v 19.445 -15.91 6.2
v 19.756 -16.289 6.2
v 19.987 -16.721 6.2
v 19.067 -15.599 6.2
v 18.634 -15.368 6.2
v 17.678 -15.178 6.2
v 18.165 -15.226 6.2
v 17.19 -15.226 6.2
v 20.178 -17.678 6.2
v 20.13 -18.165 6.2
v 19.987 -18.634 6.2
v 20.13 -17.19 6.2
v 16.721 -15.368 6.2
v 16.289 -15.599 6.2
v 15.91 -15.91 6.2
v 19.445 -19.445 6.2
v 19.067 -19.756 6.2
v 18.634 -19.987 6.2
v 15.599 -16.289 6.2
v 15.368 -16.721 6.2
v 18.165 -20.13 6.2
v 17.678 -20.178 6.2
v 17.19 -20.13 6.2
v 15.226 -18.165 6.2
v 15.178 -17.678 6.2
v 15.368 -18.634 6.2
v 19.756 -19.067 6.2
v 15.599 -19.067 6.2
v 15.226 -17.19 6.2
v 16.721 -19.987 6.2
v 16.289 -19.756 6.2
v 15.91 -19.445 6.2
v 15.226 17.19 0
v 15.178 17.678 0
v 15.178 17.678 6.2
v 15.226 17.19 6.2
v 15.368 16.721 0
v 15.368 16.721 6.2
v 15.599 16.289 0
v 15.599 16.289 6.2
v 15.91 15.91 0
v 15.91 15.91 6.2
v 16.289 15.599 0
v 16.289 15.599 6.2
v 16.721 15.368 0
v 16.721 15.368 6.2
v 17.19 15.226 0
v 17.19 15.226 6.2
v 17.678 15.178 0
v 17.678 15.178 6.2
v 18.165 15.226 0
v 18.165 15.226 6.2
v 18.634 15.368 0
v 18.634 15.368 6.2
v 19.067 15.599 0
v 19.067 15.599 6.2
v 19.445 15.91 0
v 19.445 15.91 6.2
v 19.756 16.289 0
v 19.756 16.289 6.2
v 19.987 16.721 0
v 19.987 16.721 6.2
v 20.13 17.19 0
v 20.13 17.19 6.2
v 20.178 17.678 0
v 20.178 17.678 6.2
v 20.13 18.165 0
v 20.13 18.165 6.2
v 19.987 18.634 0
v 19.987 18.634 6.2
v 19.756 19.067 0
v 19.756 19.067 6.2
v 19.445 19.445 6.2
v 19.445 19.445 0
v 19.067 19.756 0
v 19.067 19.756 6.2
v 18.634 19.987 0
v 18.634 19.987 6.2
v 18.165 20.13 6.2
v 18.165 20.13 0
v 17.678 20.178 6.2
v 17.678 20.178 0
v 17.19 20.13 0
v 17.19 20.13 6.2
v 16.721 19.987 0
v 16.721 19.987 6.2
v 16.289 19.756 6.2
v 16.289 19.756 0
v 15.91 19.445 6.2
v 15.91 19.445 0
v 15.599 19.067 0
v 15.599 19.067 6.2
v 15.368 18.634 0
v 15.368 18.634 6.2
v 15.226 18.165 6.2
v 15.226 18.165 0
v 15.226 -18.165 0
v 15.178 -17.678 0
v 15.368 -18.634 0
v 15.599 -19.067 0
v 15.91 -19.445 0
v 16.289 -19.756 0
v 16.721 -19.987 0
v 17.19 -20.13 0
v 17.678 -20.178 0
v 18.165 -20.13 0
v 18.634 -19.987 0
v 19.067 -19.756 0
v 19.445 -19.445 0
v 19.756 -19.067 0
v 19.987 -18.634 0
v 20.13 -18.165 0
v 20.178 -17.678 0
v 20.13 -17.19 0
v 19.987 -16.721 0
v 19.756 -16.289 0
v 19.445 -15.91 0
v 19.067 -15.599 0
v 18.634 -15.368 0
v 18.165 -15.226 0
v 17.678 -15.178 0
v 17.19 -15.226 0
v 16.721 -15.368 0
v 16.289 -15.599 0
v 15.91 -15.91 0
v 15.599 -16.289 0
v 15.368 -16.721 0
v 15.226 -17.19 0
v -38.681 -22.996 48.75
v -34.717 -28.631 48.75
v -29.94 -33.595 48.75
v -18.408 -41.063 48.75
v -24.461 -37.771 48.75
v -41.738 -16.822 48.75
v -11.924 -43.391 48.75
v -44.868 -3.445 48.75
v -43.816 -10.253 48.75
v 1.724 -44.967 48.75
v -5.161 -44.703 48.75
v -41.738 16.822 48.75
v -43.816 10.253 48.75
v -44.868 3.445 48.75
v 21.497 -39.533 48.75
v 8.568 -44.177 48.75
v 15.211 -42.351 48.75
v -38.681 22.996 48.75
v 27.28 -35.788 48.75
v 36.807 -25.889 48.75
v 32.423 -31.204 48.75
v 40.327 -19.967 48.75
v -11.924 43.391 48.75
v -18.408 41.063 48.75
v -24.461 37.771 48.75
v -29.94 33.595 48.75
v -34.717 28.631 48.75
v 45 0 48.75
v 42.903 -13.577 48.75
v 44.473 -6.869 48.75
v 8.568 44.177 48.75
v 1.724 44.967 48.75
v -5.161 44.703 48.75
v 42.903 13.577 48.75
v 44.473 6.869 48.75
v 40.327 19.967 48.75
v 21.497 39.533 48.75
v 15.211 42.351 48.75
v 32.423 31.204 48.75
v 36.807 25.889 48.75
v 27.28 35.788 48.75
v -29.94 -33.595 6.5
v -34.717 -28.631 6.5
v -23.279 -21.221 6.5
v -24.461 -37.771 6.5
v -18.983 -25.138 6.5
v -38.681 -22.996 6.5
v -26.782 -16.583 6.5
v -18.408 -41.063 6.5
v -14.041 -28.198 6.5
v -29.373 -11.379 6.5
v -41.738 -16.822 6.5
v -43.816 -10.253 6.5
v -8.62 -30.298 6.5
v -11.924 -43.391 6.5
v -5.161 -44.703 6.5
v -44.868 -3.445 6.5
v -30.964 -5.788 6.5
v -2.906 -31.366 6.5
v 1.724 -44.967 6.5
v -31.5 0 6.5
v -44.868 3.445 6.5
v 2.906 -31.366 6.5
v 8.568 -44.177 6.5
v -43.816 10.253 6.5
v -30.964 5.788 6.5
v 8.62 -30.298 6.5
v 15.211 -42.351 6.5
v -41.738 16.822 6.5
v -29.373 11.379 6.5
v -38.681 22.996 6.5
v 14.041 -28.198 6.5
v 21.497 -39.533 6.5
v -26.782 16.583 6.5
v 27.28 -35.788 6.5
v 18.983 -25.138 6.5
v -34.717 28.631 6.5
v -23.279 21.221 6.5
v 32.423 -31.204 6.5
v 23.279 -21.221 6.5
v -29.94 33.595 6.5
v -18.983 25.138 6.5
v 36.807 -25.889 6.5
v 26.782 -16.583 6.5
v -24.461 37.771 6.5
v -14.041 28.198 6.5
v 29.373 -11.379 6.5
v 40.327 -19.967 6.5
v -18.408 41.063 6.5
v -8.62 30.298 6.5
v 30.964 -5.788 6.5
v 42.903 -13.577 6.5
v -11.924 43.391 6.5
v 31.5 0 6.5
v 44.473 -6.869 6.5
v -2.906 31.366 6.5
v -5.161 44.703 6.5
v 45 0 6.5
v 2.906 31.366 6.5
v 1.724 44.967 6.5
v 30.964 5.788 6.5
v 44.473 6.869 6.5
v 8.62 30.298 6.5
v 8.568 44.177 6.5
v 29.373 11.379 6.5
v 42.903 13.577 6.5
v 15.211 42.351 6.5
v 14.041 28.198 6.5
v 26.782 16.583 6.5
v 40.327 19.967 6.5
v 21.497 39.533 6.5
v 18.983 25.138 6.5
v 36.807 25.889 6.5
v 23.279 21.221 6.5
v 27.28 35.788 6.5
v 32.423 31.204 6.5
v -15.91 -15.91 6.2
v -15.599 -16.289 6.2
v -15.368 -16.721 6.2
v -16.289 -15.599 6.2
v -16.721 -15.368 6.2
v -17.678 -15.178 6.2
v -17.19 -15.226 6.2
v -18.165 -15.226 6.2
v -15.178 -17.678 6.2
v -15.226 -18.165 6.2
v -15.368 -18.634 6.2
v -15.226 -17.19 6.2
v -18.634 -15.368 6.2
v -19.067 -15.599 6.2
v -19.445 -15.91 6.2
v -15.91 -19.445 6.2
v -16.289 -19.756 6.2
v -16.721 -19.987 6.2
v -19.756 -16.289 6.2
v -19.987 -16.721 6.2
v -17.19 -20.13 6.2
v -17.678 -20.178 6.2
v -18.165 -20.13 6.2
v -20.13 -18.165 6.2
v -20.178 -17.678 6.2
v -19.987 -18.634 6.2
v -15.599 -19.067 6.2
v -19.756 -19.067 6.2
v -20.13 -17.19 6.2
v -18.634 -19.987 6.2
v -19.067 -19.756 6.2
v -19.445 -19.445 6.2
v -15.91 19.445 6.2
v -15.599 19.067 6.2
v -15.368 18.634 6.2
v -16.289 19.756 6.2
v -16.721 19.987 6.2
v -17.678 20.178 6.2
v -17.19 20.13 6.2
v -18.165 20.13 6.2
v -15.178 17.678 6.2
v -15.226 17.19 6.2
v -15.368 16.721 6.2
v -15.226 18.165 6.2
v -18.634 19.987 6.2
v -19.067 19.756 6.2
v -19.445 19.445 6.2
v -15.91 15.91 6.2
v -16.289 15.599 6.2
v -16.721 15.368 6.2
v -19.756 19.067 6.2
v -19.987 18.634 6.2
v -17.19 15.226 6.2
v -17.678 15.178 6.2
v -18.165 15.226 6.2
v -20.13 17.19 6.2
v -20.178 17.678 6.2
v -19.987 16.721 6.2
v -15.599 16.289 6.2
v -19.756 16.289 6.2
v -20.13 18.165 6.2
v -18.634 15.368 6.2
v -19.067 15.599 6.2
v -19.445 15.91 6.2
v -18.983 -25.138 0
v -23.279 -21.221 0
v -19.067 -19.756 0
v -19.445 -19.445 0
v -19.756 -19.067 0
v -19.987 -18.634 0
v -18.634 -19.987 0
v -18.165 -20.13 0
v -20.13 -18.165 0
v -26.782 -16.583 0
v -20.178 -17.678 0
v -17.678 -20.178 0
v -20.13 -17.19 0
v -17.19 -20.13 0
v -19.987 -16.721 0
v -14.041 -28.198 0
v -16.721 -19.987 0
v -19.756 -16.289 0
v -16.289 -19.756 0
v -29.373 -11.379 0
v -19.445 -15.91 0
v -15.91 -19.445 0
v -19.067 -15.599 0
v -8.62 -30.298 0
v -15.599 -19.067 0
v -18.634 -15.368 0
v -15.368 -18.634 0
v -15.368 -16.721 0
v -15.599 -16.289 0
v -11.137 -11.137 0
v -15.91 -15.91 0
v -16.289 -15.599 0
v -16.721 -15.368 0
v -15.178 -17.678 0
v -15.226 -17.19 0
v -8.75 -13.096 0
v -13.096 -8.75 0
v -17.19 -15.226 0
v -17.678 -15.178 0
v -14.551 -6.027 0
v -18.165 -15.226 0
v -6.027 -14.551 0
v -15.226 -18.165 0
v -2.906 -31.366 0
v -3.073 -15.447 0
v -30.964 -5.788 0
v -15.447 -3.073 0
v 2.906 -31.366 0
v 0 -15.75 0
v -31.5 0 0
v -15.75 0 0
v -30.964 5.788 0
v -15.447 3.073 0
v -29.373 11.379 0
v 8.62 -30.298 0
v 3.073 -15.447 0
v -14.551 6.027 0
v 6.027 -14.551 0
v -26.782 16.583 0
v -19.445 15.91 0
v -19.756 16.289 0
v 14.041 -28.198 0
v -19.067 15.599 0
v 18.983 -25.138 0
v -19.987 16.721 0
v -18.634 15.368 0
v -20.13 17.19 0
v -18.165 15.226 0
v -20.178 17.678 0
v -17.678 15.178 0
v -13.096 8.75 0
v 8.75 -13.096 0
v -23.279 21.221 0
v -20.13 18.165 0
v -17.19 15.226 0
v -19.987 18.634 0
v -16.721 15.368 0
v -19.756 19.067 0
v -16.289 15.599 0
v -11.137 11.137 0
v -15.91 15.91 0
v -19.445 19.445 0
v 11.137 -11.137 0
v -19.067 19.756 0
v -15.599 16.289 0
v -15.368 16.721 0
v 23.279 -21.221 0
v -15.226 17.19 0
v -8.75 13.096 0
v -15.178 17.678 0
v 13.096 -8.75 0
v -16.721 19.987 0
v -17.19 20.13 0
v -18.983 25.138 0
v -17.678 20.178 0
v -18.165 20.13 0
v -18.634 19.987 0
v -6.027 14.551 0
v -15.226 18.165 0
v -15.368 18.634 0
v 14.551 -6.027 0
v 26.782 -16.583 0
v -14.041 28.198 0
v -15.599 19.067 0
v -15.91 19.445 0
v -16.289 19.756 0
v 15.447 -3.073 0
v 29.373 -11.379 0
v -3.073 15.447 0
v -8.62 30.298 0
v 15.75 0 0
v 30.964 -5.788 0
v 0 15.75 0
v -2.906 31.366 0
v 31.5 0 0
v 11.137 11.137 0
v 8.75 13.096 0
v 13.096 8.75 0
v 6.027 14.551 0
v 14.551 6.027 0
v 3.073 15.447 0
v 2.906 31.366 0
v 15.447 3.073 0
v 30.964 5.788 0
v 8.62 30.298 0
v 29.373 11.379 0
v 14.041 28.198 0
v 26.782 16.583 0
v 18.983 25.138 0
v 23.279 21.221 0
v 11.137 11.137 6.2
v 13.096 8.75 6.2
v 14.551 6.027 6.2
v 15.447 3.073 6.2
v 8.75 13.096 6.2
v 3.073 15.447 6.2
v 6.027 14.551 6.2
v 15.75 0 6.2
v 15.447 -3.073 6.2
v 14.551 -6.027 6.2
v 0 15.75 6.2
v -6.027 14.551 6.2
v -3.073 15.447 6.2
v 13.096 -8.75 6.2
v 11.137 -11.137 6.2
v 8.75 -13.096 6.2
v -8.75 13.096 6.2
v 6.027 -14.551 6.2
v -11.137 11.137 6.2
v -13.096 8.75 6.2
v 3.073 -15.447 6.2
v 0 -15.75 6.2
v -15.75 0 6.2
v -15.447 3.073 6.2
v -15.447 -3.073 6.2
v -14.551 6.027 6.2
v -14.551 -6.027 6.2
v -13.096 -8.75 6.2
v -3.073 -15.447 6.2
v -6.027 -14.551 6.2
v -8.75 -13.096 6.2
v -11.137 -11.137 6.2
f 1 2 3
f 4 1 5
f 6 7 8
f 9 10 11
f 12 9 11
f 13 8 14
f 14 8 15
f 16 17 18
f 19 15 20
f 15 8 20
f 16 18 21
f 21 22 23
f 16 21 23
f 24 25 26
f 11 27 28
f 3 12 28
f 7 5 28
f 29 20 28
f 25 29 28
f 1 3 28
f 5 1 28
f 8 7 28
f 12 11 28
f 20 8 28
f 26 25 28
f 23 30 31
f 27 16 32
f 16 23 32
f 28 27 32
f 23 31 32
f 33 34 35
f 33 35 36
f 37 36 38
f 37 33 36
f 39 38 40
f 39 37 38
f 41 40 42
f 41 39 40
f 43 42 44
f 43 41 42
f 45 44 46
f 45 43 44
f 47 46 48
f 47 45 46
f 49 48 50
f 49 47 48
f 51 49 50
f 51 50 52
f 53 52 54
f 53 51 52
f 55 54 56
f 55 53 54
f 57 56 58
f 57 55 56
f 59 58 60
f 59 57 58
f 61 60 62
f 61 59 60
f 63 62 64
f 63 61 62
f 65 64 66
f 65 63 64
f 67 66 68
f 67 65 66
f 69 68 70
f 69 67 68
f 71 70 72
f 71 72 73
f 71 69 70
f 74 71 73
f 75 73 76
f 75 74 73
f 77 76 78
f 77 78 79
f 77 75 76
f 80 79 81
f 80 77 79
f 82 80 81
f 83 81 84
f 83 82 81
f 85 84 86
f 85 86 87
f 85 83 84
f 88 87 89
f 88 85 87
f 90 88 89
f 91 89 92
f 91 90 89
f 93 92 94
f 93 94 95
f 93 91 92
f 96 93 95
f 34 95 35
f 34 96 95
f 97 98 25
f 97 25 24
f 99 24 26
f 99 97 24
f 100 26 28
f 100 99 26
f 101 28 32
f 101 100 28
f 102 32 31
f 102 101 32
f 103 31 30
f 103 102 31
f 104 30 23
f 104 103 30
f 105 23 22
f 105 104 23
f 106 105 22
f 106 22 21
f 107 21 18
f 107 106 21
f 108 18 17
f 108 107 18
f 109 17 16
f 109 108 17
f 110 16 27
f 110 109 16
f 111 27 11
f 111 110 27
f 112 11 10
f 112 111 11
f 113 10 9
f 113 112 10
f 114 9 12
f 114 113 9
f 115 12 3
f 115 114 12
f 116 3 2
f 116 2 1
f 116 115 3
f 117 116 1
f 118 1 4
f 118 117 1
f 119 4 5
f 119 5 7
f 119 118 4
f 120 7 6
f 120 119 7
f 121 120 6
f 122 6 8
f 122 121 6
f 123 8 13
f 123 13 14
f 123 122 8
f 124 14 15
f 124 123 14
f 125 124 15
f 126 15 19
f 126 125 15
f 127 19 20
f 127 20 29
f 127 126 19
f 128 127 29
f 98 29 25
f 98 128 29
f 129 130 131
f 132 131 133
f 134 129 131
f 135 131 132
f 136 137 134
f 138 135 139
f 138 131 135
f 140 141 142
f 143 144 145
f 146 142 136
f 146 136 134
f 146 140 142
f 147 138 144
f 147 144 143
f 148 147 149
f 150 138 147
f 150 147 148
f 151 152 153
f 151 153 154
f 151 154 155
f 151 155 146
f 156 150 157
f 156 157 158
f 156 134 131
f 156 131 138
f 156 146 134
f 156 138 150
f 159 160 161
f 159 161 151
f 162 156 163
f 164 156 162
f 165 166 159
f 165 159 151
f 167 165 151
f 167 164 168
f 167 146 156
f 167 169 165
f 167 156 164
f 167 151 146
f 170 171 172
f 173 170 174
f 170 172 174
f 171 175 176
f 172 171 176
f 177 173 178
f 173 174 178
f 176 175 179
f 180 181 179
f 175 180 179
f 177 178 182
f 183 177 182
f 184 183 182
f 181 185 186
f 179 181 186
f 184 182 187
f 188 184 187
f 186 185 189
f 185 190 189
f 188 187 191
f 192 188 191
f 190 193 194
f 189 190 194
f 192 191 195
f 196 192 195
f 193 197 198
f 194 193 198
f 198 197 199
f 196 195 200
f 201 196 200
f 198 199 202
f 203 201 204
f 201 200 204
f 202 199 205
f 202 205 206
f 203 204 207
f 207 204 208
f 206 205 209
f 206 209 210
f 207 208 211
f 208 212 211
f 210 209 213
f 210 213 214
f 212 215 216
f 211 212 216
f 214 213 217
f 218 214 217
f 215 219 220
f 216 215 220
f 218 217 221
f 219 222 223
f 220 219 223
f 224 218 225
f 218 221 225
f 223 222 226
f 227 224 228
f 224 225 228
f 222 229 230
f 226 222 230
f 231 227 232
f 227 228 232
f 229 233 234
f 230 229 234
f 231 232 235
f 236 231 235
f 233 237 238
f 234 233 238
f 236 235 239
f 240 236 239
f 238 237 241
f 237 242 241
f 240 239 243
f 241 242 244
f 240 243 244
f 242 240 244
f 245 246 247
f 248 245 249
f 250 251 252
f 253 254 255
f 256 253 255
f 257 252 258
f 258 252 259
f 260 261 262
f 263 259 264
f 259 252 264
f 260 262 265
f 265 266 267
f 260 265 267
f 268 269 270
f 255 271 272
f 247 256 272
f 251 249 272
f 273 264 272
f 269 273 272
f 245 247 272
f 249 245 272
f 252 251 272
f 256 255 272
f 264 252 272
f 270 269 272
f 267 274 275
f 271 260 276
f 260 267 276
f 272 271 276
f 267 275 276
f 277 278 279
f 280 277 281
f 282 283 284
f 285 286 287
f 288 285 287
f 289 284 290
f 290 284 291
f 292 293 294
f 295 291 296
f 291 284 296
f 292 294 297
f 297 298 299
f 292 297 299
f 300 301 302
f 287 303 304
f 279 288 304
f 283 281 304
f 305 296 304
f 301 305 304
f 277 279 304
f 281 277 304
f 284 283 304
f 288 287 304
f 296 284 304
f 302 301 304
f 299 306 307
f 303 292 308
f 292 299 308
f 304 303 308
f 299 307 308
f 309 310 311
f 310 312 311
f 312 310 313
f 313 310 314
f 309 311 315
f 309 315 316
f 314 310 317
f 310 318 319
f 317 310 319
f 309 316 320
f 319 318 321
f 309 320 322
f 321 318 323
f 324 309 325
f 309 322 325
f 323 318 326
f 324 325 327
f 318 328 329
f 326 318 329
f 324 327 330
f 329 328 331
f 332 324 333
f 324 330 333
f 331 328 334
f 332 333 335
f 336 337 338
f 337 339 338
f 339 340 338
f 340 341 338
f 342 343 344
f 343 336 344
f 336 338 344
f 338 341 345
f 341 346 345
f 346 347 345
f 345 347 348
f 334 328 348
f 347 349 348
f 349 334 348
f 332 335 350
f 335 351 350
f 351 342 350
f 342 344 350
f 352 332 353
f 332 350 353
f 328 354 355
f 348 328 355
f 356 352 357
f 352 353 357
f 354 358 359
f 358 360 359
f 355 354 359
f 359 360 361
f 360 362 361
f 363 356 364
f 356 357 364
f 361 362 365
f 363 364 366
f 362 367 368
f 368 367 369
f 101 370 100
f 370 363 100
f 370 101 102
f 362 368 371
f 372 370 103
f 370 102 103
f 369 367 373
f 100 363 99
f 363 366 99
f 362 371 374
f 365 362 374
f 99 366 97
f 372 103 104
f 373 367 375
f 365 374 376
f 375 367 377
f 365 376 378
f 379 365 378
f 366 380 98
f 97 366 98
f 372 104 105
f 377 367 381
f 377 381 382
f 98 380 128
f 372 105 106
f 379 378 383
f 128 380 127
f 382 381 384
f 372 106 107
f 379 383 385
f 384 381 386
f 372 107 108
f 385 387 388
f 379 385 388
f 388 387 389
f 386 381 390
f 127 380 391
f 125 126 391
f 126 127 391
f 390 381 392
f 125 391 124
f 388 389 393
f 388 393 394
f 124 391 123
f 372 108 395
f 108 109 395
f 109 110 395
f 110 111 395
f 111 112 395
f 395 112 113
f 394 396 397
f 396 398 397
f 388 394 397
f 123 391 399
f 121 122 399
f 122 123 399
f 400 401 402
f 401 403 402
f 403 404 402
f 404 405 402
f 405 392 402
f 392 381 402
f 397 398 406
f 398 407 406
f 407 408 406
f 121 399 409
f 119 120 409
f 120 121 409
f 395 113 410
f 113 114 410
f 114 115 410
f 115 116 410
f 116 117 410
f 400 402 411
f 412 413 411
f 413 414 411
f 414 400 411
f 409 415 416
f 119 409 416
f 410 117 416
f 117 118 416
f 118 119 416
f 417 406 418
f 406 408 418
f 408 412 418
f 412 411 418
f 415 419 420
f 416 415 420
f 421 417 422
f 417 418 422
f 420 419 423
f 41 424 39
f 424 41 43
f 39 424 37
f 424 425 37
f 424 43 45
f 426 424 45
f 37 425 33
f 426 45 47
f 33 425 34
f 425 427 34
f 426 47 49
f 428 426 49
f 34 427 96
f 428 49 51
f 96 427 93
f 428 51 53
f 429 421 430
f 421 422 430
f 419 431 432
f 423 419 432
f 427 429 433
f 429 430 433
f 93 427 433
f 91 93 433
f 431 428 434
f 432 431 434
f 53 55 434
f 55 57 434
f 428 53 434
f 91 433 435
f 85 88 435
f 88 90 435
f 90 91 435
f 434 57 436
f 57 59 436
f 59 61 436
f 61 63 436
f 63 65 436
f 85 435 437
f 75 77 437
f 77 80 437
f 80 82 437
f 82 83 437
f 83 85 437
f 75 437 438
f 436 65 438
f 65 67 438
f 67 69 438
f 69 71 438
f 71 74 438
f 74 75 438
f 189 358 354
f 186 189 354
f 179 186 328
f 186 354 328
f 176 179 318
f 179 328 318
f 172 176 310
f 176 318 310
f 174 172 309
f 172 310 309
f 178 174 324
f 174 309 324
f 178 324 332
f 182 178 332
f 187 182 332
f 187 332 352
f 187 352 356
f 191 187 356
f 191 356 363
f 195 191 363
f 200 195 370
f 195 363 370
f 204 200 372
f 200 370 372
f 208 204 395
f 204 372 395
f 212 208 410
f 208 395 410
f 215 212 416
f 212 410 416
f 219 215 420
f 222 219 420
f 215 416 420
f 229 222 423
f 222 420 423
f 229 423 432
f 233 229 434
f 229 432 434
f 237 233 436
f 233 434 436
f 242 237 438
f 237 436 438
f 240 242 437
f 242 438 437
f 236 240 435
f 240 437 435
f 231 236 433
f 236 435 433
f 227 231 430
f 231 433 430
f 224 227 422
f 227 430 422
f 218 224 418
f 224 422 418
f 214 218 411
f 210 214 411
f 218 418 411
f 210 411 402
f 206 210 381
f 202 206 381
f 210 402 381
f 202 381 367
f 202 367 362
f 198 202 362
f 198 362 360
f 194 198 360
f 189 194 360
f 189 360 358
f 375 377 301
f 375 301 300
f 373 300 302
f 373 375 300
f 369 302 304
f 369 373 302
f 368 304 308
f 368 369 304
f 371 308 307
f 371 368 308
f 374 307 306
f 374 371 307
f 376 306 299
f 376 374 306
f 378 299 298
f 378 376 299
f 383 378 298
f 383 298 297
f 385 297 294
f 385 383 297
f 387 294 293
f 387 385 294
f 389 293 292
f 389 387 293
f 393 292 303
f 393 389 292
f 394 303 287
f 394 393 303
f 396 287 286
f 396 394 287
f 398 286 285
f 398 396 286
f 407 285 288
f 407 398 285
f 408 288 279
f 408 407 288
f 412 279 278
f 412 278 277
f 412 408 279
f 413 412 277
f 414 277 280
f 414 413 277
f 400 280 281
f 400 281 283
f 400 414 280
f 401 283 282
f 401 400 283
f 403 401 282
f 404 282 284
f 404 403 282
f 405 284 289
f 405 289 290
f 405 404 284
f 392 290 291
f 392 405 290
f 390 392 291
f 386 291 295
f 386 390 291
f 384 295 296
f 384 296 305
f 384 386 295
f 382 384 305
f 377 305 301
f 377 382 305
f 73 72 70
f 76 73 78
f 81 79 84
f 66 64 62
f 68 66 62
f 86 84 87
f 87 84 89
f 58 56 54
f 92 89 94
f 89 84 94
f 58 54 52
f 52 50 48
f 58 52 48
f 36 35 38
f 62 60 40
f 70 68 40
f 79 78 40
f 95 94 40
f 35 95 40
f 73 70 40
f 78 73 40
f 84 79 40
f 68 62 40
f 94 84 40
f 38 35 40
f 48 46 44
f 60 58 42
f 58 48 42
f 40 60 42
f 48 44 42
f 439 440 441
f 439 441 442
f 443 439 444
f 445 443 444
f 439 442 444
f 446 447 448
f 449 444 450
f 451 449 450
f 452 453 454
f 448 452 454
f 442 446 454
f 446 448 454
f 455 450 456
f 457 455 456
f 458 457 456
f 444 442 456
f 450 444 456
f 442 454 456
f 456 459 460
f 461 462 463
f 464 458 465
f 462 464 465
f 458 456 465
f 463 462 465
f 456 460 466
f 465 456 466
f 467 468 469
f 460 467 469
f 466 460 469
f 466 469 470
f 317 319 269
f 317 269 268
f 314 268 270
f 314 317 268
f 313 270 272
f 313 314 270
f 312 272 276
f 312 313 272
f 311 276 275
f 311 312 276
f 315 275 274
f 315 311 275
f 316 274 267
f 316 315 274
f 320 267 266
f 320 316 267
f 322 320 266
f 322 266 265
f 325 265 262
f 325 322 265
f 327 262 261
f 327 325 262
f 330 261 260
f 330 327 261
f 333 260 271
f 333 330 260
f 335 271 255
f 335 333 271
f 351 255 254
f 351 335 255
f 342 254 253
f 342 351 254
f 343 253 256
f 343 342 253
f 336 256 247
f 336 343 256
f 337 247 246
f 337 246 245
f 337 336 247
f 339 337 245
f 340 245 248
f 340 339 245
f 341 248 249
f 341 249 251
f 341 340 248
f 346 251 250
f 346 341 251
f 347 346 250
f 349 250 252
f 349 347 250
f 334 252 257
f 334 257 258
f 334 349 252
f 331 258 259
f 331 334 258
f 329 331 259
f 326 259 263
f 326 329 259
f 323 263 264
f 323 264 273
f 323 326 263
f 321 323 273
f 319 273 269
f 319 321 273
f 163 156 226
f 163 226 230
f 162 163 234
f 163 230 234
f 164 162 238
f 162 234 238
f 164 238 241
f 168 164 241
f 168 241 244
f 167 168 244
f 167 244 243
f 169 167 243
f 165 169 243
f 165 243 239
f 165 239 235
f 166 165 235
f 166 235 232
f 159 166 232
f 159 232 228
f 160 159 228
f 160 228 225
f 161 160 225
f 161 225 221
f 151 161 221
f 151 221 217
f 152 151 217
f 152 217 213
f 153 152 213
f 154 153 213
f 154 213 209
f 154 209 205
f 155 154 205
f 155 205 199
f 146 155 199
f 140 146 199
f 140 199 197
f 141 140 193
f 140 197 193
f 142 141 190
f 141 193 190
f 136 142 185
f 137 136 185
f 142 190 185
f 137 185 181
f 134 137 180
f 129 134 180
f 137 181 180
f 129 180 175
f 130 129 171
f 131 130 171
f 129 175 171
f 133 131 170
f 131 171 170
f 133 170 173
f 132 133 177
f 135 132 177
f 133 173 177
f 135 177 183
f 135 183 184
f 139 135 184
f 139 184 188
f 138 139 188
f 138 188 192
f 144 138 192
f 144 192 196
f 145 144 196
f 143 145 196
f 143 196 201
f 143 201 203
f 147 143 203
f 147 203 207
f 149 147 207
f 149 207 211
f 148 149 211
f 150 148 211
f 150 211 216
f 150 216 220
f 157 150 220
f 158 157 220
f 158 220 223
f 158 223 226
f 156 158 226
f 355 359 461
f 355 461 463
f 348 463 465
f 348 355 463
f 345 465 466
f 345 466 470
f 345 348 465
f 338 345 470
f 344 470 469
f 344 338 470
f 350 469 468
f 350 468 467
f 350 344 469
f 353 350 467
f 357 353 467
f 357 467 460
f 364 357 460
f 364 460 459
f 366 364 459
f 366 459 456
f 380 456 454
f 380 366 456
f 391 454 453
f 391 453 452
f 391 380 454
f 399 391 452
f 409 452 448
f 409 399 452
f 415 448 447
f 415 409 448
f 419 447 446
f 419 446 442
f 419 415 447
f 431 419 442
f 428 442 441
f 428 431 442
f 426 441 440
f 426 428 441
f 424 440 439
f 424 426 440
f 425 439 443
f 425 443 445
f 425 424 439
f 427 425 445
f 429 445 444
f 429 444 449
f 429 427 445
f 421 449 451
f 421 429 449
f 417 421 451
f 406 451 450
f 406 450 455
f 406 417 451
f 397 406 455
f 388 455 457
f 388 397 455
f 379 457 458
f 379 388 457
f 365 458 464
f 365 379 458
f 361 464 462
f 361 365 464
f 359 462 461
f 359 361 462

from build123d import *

# Parameters (mm, degrees)
SKETCH1_R           = 45
BOSS_EXTRUDE1_DEPTH = 48.75
SKETCH1_3_R         = 45
SKETCH1_3_R_2       = 31.5
CUT_EXTRUDE1_DEPTH  = 6.5
SKETCH1_4_R         = 15.75
SKETCH1_4_R_2       = 2.5
CUT_EXTRUDE2_DEPTH  = 6.2


with BuildPart() as part:
    # Sketch1 → Boss-Extrude1 (new body)
    with BuildSketch(Plane.XY):
        Circle(SKETCH1_R)
    extrude(amount=BOSS_EXTRUDE1_DEPTH)

    # Sketch1<3> → Cut-Extrude1 (cut)
    with BuildSketch(Plane.XY):
        Circle(SKETCH1_3_R)
        Circle(SKETCH1_3_R_2, mode=Mode.SUBTRACT)
    extrude(amount=CUT_EXTRUDE1_DEPTH, mode=Mode.SUBTRACT)

    # Sketch1<4> → Cut-Extrude2 (cut)
    with BuildSketch(Plane.XY):
        Circle(SKETCH1_4_R)
        with Locations((17.67766953, 17.67766953)):
            Circle(SKETCH1_4_R_2)
        with Locations((17.67766953, -17.67766953)):
            Circle(SKETCH1_4_R_2)
        with Locations((-17.67766953, -17.67766953)):
            Circle(SKETCH1_4_R_2)
        with Locations((-17.67766953, 17.67766953)):
            Circle(SKETCH1_4_R_2)
    extrude(amount=CUT_EXTRUDE2_DEPTH, mode=Mode.SUBTRACT)


solid = part.part
